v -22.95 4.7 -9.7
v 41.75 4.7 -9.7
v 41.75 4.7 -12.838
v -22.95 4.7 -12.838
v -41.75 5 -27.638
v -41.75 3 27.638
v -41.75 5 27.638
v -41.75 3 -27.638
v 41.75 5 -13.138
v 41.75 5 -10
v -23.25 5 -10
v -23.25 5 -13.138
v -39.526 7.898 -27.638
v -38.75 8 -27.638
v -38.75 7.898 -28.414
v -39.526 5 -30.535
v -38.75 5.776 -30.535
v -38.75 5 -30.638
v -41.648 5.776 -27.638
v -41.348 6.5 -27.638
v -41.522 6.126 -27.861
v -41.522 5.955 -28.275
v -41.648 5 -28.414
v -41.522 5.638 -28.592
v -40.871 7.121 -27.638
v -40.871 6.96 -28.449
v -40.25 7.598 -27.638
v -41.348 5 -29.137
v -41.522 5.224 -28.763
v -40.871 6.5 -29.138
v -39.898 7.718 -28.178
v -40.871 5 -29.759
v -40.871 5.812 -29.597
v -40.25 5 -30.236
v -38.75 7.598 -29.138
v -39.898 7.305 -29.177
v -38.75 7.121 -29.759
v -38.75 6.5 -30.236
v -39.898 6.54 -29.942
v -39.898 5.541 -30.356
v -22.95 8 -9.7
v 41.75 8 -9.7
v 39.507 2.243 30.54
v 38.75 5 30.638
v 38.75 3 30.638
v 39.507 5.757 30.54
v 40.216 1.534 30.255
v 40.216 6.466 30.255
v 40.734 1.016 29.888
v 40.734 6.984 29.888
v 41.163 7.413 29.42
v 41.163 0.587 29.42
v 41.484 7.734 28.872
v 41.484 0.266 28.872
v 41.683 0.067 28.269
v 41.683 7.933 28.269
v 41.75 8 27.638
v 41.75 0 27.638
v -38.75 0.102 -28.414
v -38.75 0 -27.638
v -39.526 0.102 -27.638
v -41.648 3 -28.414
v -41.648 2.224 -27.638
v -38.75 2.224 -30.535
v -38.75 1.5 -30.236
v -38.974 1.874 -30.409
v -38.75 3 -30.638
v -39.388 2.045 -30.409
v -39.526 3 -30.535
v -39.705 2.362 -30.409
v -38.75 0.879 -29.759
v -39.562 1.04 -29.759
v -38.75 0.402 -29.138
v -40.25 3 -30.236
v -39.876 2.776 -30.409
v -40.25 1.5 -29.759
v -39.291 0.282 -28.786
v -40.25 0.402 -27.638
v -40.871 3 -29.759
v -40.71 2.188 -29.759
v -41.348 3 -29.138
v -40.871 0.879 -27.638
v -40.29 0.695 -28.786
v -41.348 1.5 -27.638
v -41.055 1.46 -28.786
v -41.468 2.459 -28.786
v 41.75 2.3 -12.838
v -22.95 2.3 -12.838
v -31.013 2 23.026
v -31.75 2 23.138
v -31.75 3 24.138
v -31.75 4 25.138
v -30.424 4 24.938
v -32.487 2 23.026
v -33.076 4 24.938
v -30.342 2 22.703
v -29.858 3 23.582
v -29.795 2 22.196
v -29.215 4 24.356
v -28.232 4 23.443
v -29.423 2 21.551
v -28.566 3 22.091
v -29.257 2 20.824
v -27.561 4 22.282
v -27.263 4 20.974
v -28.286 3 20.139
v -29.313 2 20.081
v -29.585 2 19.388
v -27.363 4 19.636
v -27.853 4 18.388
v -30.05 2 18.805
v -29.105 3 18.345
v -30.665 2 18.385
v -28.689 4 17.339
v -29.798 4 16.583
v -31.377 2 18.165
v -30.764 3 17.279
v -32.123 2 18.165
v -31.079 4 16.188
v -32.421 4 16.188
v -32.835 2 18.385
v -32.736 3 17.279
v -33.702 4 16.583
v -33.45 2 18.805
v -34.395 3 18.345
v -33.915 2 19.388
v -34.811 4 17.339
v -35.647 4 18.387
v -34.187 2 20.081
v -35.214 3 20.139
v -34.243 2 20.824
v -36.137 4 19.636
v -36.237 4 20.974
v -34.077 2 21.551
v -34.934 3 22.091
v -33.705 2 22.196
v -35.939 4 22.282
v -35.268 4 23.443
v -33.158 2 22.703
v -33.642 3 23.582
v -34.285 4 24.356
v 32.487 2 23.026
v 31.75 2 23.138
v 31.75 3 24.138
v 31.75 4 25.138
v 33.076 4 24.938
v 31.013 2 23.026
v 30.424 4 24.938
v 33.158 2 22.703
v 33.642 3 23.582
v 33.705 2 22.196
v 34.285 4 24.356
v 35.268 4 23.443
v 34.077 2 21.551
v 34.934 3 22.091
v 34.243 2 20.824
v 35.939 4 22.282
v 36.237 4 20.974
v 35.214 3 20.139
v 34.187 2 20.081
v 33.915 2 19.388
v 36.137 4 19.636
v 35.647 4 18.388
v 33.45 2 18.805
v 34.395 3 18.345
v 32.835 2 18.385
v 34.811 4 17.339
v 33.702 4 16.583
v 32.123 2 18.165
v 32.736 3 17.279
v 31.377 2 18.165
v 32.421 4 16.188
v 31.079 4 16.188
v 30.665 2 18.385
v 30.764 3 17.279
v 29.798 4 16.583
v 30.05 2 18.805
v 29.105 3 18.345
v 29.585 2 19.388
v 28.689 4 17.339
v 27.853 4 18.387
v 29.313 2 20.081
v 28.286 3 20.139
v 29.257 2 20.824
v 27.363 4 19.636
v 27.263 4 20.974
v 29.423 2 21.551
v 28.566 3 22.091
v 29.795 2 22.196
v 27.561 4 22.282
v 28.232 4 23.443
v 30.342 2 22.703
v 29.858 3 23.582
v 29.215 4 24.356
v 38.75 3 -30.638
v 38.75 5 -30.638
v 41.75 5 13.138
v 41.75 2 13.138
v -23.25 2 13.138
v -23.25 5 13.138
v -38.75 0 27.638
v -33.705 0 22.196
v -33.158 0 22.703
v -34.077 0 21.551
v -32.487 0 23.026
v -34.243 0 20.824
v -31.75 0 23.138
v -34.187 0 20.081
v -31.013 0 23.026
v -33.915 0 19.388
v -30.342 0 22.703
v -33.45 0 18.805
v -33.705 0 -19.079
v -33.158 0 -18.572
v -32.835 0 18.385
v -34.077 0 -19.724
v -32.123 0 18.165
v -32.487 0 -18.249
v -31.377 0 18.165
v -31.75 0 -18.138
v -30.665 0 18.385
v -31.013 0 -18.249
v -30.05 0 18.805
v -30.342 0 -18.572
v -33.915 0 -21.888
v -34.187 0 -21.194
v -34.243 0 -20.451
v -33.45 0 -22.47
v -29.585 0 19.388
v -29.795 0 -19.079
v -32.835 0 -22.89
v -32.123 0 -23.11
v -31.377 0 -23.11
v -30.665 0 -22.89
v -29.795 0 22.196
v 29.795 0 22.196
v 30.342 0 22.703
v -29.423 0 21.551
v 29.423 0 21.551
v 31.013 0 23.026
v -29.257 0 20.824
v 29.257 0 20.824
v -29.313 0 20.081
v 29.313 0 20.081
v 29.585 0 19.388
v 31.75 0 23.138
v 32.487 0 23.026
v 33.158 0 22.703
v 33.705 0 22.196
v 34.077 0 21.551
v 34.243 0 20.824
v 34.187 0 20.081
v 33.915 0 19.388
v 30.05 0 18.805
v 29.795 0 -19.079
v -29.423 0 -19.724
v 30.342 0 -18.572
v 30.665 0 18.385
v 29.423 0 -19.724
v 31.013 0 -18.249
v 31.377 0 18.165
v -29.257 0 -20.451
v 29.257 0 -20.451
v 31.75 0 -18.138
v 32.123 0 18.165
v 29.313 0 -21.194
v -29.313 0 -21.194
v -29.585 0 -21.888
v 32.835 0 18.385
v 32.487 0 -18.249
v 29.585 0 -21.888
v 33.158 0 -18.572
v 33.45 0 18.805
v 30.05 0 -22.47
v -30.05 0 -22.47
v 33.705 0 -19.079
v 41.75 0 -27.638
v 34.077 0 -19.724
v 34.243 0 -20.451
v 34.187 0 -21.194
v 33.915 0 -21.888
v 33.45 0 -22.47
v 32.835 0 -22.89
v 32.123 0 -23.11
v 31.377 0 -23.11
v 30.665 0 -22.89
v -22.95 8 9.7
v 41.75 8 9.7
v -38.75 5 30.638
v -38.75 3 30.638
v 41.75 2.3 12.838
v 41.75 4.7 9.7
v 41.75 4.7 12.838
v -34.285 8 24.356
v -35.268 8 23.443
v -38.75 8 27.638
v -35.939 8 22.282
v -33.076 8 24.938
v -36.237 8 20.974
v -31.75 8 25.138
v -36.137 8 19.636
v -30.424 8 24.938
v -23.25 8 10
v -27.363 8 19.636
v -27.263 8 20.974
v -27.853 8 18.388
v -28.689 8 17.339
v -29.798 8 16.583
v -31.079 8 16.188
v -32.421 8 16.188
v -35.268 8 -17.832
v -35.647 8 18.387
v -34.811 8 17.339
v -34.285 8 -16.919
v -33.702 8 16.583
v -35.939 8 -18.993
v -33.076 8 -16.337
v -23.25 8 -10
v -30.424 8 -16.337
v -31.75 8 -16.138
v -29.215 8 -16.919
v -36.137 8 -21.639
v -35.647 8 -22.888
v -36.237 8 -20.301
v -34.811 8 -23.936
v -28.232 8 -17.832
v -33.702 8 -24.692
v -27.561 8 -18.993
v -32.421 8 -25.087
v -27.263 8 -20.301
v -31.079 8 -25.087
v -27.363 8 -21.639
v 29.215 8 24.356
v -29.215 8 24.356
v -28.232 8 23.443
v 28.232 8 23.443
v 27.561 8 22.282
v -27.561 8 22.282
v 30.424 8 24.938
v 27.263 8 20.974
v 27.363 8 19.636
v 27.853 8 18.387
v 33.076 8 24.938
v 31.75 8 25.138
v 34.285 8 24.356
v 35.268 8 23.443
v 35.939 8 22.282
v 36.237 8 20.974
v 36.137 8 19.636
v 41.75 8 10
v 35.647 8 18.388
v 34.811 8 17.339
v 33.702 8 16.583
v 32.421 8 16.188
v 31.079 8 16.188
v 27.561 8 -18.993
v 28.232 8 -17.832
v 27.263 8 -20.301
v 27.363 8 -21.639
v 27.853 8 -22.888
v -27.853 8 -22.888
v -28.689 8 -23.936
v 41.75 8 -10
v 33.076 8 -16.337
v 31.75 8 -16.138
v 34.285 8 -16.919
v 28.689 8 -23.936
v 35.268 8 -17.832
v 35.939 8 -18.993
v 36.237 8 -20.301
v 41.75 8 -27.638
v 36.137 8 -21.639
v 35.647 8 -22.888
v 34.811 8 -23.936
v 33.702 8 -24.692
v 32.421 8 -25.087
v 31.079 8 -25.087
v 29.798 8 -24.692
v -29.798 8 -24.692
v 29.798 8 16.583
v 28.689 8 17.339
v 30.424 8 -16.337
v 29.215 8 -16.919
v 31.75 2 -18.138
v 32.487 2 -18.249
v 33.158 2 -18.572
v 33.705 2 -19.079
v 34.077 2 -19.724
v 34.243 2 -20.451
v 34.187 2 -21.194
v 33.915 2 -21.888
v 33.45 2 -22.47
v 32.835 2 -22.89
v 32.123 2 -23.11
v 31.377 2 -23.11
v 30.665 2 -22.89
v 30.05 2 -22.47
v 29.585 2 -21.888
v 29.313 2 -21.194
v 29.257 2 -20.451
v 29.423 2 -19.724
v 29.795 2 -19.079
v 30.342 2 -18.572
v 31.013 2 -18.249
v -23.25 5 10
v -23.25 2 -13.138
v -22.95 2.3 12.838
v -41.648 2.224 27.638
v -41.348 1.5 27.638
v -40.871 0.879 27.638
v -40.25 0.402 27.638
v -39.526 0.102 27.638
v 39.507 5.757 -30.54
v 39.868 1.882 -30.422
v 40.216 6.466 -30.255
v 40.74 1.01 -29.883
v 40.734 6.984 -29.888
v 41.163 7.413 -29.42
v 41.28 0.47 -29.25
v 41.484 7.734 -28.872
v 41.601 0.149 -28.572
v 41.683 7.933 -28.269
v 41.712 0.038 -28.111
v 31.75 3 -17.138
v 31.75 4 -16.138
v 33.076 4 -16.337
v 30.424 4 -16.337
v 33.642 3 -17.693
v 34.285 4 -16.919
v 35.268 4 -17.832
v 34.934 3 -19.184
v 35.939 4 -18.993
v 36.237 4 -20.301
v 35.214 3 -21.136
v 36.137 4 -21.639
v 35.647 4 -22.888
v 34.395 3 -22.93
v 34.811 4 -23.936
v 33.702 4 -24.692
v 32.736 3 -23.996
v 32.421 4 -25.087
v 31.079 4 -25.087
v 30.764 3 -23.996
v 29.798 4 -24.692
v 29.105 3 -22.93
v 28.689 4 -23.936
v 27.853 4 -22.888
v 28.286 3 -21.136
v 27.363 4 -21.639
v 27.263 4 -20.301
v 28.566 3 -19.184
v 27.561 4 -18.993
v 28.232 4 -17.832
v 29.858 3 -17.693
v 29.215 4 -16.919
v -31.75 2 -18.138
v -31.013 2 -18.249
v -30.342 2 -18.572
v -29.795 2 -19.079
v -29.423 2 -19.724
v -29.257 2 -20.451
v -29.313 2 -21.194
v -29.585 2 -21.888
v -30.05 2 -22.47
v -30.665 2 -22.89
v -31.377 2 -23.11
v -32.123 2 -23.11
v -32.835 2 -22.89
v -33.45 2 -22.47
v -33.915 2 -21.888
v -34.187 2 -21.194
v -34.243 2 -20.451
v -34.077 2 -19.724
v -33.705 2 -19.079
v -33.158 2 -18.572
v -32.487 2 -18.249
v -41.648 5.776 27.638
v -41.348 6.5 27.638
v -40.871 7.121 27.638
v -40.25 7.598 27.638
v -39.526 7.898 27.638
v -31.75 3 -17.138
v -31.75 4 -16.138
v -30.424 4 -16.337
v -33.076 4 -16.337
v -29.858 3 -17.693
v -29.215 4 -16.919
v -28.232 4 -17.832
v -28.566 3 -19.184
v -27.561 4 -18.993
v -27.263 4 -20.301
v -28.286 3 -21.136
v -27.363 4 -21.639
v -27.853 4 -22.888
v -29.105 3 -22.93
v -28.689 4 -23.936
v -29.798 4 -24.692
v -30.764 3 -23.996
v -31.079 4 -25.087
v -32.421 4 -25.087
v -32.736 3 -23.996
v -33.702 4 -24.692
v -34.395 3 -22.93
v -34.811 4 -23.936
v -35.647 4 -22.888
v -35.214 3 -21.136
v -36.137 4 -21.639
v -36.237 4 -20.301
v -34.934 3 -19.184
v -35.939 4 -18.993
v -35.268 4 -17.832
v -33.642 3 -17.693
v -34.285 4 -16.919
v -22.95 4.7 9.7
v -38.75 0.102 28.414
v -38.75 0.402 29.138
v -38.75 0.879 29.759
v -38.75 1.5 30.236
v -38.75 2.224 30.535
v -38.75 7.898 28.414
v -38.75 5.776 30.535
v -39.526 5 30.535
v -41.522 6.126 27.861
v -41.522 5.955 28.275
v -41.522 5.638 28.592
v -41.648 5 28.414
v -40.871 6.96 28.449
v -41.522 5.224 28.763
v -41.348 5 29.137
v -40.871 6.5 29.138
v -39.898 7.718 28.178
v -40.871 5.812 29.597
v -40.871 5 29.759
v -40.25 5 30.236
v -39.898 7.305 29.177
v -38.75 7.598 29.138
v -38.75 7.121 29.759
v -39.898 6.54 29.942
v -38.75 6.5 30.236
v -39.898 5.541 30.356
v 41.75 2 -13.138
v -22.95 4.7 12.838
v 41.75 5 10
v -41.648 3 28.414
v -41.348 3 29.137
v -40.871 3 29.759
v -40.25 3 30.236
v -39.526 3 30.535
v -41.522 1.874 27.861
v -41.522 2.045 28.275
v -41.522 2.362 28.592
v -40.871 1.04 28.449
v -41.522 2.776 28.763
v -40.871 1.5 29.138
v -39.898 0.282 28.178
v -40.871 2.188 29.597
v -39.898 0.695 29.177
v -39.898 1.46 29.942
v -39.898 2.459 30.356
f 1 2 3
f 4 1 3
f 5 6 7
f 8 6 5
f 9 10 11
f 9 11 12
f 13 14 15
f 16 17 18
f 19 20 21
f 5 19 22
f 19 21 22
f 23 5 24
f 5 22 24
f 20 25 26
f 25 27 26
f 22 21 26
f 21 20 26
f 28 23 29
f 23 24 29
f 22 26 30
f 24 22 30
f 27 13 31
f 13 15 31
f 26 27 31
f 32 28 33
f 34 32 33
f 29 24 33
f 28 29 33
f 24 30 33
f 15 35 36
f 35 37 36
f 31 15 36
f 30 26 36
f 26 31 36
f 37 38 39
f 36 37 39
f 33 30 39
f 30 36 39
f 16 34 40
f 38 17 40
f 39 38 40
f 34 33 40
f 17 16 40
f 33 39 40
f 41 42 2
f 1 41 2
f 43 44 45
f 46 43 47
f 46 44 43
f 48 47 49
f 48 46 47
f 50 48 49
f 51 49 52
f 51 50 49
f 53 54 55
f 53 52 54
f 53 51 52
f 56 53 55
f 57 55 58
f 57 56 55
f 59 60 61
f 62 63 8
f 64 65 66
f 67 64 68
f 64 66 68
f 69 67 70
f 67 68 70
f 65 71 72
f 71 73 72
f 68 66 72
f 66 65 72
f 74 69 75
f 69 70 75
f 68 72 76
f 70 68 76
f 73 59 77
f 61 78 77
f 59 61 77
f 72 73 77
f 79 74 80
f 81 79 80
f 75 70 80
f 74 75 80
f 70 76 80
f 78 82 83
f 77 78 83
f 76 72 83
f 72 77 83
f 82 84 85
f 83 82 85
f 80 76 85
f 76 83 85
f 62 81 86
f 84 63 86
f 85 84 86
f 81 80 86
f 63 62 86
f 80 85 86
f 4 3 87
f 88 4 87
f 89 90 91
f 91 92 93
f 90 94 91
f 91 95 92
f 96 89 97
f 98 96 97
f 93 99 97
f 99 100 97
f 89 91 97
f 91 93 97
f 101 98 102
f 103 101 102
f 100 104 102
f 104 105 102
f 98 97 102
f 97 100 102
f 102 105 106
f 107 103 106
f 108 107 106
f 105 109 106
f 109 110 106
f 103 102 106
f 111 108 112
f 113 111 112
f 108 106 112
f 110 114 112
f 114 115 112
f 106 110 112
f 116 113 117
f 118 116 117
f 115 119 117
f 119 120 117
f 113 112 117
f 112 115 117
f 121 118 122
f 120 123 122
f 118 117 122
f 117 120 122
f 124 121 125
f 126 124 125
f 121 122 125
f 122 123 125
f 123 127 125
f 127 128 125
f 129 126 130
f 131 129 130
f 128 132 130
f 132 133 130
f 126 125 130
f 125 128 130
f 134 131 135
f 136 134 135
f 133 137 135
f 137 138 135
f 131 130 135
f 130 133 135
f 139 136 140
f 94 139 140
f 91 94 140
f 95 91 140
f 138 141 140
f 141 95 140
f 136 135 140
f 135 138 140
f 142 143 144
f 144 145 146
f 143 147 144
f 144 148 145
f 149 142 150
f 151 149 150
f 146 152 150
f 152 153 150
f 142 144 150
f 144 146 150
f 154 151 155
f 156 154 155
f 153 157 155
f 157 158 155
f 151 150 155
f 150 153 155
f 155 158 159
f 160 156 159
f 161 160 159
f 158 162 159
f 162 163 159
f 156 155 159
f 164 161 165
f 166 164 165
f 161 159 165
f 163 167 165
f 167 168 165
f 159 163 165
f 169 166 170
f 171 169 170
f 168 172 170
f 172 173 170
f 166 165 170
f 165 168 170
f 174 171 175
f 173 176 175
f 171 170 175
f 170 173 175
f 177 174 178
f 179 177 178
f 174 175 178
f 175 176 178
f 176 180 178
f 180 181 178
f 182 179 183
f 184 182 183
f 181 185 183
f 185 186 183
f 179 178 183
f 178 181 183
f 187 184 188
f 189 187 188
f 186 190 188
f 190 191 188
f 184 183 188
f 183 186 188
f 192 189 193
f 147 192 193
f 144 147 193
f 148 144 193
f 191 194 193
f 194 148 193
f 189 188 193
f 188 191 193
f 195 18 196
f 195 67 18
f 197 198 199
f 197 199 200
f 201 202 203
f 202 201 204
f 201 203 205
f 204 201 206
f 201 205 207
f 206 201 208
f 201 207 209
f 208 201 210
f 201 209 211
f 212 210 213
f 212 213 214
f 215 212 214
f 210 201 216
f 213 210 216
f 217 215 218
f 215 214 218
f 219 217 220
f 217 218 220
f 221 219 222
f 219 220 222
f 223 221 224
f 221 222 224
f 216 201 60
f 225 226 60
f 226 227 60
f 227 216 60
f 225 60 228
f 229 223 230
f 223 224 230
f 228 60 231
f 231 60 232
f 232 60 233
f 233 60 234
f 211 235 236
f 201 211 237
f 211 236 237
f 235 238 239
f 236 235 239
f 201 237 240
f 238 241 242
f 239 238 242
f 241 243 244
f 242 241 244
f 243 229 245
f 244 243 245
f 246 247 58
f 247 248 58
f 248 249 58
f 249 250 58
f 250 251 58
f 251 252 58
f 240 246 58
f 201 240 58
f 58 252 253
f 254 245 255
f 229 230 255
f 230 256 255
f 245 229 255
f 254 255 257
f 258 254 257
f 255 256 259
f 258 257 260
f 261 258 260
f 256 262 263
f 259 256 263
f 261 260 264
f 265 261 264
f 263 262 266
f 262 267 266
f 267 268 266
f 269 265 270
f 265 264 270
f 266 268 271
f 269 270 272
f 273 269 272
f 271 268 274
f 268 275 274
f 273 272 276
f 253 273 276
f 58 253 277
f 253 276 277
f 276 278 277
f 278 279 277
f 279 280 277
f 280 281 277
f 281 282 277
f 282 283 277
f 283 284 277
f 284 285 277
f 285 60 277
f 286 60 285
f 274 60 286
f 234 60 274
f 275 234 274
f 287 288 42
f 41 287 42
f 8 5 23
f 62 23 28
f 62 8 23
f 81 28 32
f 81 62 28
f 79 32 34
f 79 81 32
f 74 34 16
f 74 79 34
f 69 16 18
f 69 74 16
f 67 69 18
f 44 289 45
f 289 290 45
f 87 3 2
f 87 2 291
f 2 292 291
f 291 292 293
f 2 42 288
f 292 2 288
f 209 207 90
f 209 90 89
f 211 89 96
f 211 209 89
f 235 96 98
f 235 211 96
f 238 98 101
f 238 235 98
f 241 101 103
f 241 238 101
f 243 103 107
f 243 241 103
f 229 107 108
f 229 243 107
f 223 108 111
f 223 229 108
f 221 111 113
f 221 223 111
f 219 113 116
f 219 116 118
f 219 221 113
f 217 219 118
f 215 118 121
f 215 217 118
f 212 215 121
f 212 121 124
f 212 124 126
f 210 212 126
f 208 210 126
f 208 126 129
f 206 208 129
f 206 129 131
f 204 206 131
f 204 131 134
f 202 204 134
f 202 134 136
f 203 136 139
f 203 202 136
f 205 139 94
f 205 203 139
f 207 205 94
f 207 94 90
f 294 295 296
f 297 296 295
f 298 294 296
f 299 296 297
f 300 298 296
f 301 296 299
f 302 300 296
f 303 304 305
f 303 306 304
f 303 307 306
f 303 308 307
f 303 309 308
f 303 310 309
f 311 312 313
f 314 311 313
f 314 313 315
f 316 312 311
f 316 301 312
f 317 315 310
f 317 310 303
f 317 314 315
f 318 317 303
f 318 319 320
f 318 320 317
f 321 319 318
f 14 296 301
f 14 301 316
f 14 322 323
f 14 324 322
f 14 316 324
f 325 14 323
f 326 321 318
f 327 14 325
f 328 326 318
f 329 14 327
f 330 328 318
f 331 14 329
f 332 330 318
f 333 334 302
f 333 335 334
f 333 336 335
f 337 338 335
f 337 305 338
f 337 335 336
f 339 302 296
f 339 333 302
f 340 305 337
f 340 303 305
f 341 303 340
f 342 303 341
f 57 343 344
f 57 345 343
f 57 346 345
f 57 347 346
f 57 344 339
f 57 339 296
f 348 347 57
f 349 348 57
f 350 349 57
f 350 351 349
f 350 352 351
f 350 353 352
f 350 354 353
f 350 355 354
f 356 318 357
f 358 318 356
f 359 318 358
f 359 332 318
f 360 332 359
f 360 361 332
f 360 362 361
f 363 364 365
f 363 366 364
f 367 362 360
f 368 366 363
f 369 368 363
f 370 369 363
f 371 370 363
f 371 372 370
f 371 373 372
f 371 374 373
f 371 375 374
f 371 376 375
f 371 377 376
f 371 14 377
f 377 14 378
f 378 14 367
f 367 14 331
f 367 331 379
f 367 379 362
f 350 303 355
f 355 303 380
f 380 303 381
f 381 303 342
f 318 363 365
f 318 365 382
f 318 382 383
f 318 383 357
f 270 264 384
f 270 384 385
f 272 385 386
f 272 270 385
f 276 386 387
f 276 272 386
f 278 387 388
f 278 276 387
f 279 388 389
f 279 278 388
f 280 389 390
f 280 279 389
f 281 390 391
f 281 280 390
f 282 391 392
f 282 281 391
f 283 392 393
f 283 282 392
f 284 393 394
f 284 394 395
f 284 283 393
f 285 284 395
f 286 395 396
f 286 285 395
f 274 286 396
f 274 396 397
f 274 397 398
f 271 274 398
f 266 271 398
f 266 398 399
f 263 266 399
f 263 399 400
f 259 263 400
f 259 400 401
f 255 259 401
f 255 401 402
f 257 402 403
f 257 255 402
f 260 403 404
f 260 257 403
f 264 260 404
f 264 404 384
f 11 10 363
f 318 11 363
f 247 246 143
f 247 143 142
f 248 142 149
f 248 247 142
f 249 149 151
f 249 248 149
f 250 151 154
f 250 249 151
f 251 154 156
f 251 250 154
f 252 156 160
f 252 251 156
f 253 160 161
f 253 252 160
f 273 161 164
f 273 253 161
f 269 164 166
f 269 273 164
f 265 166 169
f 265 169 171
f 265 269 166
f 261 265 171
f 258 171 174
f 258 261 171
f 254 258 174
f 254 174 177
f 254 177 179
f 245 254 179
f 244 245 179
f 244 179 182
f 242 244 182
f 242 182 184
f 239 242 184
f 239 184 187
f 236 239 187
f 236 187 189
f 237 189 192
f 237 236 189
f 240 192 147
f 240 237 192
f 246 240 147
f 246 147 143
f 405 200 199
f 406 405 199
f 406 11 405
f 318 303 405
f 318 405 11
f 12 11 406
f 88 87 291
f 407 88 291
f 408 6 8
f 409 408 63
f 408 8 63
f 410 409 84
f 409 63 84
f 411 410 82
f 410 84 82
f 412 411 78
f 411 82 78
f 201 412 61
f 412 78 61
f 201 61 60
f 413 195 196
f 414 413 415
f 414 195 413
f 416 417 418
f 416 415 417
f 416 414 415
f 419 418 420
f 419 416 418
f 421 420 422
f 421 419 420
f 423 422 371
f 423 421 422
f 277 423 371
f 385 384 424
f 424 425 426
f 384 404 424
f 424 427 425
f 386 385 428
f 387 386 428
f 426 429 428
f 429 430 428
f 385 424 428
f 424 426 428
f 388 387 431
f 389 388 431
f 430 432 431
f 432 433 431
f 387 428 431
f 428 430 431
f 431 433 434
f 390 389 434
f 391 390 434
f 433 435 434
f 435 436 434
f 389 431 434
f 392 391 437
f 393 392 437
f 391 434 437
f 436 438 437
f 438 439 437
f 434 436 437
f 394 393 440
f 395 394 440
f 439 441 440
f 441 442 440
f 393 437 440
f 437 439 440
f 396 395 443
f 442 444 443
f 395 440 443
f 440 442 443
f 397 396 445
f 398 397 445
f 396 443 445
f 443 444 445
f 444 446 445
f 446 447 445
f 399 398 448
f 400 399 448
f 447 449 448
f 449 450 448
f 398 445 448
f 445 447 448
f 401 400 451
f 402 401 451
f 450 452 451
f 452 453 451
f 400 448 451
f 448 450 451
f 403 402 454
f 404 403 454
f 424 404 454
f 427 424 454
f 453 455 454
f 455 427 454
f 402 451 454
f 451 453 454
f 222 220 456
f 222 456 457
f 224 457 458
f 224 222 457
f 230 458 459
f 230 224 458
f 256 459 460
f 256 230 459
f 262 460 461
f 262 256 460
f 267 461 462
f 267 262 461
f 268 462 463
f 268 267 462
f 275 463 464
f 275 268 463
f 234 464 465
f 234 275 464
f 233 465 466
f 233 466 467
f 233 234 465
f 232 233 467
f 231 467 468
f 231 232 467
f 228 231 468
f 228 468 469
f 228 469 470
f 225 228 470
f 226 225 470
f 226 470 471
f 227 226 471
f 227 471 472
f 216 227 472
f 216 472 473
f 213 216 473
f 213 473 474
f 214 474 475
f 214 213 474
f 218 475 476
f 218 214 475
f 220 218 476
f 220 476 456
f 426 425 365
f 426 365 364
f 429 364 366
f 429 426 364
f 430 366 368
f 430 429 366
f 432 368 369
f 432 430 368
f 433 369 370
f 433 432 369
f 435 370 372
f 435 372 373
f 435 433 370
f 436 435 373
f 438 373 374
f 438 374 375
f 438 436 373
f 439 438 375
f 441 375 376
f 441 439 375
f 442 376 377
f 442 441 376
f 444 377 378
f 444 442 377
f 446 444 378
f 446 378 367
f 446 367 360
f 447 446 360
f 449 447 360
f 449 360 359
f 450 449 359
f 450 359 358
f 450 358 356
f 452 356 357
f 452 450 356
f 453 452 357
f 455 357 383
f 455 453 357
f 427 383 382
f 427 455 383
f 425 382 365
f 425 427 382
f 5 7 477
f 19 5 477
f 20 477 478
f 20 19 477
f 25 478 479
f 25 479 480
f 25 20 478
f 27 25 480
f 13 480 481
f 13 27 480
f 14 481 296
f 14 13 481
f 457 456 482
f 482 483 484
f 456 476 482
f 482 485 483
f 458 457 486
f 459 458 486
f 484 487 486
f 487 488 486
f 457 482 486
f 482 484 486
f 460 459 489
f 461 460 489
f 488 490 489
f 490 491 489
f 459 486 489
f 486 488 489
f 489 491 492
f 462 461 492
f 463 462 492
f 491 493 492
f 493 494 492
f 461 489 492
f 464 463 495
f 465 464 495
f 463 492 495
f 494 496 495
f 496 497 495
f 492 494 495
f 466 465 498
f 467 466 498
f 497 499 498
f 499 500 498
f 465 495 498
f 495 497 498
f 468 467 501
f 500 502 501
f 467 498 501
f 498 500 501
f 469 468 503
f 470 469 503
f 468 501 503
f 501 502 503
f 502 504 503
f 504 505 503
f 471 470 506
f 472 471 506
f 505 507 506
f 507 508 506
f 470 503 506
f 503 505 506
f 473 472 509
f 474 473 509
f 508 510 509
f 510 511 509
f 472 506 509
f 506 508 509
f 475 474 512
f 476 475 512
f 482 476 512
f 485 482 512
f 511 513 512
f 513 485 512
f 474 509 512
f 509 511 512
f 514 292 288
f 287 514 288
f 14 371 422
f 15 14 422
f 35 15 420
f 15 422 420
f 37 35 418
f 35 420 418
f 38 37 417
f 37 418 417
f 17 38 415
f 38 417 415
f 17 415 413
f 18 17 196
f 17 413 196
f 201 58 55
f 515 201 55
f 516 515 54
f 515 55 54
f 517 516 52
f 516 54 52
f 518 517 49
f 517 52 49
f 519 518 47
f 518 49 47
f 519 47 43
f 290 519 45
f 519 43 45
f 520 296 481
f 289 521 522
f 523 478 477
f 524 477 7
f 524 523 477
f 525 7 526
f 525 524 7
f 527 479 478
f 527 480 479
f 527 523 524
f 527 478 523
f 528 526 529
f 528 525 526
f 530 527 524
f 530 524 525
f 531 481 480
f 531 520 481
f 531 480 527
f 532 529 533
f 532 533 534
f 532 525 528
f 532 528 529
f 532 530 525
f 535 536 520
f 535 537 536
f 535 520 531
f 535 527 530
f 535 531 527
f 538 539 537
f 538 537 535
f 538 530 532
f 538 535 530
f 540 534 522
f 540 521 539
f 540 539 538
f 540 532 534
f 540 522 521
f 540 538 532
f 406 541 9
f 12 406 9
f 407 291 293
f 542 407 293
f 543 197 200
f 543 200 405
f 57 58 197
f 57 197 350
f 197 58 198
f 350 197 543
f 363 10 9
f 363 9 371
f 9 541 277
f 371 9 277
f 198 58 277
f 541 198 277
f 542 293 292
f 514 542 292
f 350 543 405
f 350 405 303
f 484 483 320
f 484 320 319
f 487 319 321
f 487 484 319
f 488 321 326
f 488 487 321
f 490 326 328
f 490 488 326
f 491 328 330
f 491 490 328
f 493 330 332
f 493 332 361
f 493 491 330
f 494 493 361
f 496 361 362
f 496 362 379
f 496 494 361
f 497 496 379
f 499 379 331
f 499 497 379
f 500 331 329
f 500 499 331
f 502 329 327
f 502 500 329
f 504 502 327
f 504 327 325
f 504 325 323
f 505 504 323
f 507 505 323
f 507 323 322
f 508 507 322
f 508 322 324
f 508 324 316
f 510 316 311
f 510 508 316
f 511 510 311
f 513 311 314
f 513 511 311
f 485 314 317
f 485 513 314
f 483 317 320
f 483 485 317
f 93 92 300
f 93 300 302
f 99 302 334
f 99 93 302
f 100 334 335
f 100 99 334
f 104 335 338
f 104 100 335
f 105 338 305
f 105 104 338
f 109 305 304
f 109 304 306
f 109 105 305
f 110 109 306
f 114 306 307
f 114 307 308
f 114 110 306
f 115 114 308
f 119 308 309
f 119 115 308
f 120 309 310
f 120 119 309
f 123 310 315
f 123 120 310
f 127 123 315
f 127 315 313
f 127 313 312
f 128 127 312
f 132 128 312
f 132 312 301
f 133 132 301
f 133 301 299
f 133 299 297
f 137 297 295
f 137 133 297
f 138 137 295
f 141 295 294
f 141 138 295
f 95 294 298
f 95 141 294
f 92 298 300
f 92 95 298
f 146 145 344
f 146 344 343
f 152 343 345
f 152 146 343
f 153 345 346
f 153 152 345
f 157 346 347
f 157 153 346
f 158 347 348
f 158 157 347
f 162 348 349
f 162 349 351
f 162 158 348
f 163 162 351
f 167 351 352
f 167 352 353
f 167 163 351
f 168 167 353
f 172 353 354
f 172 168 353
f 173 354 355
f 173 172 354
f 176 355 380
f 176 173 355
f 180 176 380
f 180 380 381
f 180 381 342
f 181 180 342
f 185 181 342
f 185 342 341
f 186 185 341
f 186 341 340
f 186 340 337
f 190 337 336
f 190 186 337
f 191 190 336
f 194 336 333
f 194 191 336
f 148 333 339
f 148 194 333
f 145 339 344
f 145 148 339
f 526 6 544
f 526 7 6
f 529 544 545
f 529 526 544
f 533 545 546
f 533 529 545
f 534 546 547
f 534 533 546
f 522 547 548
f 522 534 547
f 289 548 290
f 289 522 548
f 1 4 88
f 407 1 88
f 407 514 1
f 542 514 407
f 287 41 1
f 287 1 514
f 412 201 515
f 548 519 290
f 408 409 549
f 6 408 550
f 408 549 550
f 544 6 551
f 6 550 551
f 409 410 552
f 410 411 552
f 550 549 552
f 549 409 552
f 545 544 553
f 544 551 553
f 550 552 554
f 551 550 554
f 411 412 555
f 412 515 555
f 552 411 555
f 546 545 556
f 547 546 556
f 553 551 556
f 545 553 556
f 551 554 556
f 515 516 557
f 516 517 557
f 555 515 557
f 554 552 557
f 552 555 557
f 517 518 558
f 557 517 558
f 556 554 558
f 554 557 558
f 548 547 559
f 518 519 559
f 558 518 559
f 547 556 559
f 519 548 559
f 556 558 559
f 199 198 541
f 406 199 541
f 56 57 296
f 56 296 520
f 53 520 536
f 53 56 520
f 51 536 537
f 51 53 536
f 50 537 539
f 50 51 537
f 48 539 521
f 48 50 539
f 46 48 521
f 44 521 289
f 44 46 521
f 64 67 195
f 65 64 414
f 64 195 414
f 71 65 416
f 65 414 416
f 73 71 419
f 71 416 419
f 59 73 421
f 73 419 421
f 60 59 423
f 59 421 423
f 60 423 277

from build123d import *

# Parameters (mm, degrees)
SKETCH1_W           = 83.5
SKETCH1_H           = 61.275
SKETCH1_R           = 2.5
BOSS_EXTRUDE1_DEPTH = 4
CHAMFER1_SIZE       = 2
SKETCH3_W           = 83.5
SKETCH3_H           = 61.275
SKETCH3_R           = 4.5
BOSS_EXTRUDE2_DEPTH = 4
SKETCH4_W           = 26.275
SKETCH4_H           = 3
SKETCH4_W_2         = 20
CUT_EXTRUDE1_DEPTH  = 65
BOSS_EXTRUDE3_DEPTH = 64.7
FILLET1_R           = 3


with BuildPart() as part:
    # Sketch1 → Boss-Extrude1 (new body)
    with BuildSketch(Plane(origin=(0, 0, 0), x_dir=(1, 0, 0), z_dir=(0, 1, 0))):
        Rectangle(SKETCH1_W, SKETCH1_H)
        with Locations(Location((-31.75, 20.6375, 0), (0, 0, 270))):
            Circle(SKETCH1_R, mode=Mode.SUBTRACT)
        with Locations(Location((-31.75, -20.6375, 0), (0, 0, 270))):
            Circle(SKETCH1_R, mode=Mode.SUBTRACT)
        with Locations(Location((31.75, -20.6375, 0), (0, 0, 270))):
            Circle(SKETCH1_R, mode=Mode.SUBTRACT)
        with Locations(Location((31.75, 20.6375, 0), (0, 0, 270))):
            Circle(SKETCH1_R, mode=Mode.SUBTRACT)
    extrude(amount=BOSS_EXTRUDE1_DEPTH)

    # Chamfer1
    chamfer1_edges = [part.edges().sort_by_distance(p)[0] for p in [
        (-31.75, 4, -23.1375),
        (-31.75, 4, 18.1375),
        (31.75, 4, 18.1375),
        (31.75, 4, -23.1375),
    ]]
    chamfer(chamfer1_edges, length=CHAMFER1_SIZE)

    # Sketch3 → Boss-Extrude2 (add)
    with BuildSketch(Plane(origin=(0, 4, 0), x_dir=(1, 0, 0), z_dir=(0, 1, 0))):
        Rectangle(SKETCH3_W, SKETCH3_H)
        with Locations(Location((31.75, 20.6375, 0), (0, 0, 270))):
            Circle(SKETCH3_R, mode=Mode.SUBTRACT)
        with Locations(Location((31.75, -20.6375, 0), (0, 0, 270))):
            Circle(SKETCH3_R, mode=Mode.SUBTRACT)
        with Locations(Location((-31.75, -20.6375, 0), (0, 0, 270))):
            Circle(SKETCH3_R, mode=Mode.SUBTRACT)
        with Locations(Location((-31.75, 20.6375, 0), (0, 0, 270))):
            Circle(SKETCH3_R, mode=Mode.SUBTRACT)
    extrude(amount=BOSS_EXTRUDE2_DEPTH)

    # Sketch4 → Cut-Extrude1 (cut)
    with BuildSketch(Plane(origin=(41.75, 0, 0), x_dir=(0, 0, -1), z_dir=(1, 0, 0))):
        with Locations((0, 3.5)):
            Rectangle(SKETCH4_W, SKETCH4_H)
        with Locations((0, 6.5)):
            Rectangle(SKETCH4_W_2, SKETCH4_H)
    extrude(amount=-CUT_EXTRUDE1_DEPTH, mode=Mode.SUBTRACT)

    # Fillet1
    fillet1_edges = [part.edges().sort_by_distance(p)[0] for p in [
        (0, 8, 30.6375),
        (0, 8, -30.6375),
        (-41.75, 8, 0),
        (0, 0, 30.6375),
        (-41.75, 0, 0),
        (0, 0, -30.6375),
        (41.75, 4, 30.6375),
        (-41.75, 4, 30.6375),
        (-41.75, 4, -30.6375),
        (41.75, 4, -30.6375),
    ]]
    fillet(fillet1_edges, radius=FILLET1_R)


with BuildPart() as body_2:
    # Sketch5 → Boss-Extrude3 (new body)
    with BuildSketch(Plane(origin=(41.75, 0, 0), x_dir=(0, 0, -1), z_dir=(1, 0, 0))):
        Polygon((-9.7, 8), (9.7, 8), (9.7, 4.7), (12.8375, 4.7), (12.8375, 2.3), (-12.8375, 2.3), (-12.8375, 4.7), (-9.7, 4.7), align=None)
    extrude(amount=-BOSS_EXTRUDE3_DEPTH)


solid = Compound([part.part, body_2.part])
